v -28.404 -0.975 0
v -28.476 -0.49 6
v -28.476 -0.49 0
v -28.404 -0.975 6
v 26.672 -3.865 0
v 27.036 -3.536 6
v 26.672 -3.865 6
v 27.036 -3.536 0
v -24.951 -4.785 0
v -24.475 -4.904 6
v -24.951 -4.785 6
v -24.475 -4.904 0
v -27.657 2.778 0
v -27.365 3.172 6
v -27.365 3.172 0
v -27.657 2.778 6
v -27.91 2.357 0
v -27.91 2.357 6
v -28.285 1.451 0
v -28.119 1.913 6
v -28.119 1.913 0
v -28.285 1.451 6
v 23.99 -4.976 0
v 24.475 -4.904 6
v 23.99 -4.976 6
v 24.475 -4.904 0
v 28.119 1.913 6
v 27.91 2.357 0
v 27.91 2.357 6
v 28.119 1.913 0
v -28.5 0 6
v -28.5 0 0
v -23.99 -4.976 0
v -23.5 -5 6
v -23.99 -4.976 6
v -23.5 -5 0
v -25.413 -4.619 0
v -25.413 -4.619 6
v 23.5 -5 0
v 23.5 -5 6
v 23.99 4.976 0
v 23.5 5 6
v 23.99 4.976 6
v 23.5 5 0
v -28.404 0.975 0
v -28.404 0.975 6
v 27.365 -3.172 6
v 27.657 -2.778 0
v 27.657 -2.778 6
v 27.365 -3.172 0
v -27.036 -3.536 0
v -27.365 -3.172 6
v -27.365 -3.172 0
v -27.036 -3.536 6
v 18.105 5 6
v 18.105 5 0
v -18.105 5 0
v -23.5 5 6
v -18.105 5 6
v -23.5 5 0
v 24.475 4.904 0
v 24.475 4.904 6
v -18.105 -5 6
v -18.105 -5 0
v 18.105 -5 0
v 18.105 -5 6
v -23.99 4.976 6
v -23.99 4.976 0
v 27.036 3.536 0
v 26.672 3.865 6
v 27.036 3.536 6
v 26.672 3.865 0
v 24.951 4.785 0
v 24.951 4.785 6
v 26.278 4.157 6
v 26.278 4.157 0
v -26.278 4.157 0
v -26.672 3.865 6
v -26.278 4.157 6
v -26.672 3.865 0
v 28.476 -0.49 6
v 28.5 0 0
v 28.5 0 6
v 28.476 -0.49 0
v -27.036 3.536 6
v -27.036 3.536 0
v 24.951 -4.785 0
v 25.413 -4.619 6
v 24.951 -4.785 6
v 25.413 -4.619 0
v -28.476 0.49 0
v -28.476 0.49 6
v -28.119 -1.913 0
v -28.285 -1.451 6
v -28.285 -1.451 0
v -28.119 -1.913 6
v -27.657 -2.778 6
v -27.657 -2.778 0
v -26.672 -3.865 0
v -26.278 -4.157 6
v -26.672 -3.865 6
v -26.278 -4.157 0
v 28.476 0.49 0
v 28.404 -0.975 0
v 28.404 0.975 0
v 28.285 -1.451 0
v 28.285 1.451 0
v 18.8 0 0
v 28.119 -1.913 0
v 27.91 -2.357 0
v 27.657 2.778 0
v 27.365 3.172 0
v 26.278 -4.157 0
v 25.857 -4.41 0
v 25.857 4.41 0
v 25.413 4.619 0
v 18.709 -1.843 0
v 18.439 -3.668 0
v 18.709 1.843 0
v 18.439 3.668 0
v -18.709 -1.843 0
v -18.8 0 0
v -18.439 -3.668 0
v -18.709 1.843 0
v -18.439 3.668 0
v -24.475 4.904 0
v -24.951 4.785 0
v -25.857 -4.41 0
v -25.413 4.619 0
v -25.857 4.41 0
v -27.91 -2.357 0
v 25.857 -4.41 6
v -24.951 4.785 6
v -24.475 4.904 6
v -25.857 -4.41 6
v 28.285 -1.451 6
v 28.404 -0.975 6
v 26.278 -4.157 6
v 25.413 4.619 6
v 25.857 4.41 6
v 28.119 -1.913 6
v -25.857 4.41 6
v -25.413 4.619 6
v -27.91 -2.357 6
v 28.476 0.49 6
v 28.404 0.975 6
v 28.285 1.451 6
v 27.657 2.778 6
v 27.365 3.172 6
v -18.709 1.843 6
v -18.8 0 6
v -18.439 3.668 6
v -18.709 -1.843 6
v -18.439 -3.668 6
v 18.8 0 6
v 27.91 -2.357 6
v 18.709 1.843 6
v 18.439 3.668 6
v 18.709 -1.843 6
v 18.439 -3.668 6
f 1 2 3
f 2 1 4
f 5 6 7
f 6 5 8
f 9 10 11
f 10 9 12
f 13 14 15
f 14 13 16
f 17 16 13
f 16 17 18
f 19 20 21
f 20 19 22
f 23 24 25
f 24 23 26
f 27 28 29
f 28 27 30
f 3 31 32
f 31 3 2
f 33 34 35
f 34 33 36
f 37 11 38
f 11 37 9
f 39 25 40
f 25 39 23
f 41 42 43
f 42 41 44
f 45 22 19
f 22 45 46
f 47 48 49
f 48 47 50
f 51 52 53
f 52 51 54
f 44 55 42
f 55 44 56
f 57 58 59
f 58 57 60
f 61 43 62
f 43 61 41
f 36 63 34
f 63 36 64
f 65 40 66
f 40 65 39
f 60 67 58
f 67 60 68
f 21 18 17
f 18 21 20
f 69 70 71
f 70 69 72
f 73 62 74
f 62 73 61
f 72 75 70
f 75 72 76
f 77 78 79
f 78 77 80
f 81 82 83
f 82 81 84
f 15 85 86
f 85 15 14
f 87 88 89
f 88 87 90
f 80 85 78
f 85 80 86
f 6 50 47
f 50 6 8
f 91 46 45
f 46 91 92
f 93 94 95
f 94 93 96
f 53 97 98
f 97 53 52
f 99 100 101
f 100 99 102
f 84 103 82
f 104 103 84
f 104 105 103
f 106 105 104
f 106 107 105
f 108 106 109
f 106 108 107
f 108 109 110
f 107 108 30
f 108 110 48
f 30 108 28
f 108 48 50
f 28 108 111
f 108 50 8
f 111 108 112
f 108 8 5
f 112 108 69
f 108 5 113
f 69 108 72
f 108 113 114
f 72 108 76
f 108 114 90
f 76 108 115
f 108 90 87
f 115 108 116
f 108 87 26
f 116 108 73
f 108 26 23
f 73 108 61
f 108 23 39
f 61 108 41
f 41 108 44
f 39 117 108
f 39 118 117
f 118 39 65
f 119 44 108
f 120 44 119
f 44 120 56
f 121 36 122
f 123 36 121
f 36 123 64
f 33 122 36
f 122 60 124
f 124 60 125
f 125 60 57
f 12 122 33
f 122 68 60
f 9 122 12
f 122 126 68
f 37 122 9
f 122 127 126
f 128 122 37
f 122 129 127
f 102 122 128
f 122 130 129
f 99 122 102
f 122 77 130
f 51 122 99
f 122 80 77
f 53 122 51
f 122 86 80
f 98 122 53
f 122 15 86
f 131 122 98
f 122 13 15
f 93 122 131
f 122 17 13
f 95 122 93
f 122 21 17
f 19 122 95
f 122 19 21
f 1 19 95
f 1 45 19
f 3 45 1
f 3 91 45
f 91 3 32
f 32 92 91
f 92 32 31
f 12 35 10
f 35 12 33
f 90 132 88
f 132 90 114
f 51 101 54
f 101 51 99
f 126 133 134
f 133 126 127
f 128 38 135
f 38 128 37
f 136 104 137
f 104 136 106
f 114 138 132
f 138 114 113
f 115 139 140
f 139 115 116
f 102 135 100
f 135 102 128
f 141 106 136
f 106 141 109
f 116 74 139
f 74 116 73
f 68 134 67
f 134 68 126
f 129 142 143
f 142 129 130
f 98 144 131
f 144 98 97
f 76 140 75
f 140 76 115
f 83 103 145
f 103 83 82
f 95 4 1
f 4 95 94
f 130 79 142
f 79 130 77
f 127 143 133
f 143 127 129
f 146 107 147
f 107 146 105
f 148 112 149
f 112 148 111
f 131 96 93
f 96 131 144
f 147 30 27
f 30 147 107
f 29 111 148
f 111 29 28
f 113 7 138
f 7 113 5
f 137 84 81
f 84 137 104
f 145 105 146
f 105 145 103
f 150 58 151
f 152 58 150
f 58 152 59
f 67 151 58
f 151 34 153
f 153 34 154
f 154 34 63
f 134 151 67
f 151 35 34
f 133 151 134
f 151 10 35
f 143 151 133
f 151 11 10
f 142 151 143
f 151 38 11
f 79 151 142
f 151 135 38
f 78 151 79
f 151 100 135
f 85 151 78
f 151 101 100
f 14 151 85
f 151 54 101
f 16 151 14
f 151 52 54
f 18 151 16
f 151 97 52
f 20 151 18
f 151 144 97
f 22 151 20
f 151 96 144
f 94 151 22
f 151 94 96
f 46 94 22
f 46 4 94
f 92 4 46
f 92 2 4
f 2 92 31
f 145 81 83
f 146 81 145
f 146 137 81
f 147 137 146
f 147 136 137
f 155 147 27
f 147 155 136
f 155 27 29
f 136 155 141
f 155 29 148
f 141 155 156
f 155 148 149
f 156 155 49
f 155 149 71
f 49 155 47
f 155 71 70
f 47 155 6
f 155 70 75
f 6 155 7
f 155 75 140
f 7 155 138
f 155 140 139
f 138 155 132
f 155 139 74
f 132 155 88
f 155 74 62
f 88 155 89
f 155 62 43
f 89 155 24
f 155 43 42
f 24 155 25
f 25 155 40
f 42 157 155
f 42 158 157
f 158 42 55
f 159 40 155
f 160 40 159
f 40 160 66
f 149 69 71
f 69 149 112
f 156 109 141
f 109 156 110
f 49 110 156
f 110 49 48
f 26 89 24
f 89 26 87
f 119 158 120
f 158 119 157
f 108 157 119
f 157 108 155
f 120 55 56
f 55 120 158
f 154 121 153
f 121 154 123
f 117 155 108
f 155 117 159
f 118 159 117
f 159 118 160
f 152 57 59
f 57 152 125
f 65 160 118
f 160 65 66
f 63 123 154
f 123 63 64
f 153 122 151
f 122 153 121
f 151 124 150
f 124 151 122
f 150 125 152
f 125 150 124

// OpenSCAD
// file: params.scad
// ============================================================================
//  Робосумо 3 кг — спільні параметри
//  Усі розміри в міліметрах. Прав завжди тут, а не в окремих деталях.
//
//  Позначки:
//    ✅  підтверджено з даташита виробника
//    ❓  VERIFY — виміряй свою деталь штангенциркулем і виправ
// ============================================================================

// --- габарит робота ---------------------------------------------------------
CHASSIS_W       = 200;      // ✅ ліміт класу 200 x 200 мм
CHASSIS_L       = 200;
PLATE_T         = 6;        // товщина друкованого прототипу основи
ALLOY_T         = 4;        // товщина алюмінієвої бойової основи

// --- колеса -----------------------------------------------------------------
WHEEL_D         = 50;
WHEEL_W         = 15;
WHEEL_TRACK     = 150;      // між центрами коліс уздовж осі X
WHEELBASE       = 130;      // між центрами коліс уздовж осі Y

// --- мотор Pololu 37D (✅ усі з pololu.com/product/4745) --------------------
MOTOR_BODY_D    = 37;       // ✅ діаметр корпусу редуктора
MOTOR_SHAFT_D   = 6;        // ✅ D-подібний вал
MOTOR_SHAFT_L   = 16;       // ✅ довжина вала
MOTOR_HEX_PITCH = 15.5;     // ✅ суміжні отвори кріплення, правильний шестикутник
MOTOR_HEX_R     = MOTOR_HEX_PITCH / sqrt(3);   // ≈ 8.949 радіус описаного кола
MOTOR_SCREW_MAX = 3;        // ✅ Pololu: НЕ закручувати глибше 3 мм — дістане шестерні
MOTOR_TOTAL_L   = 57;       // ✅ 37Dx57L

// --- кріплення --------------------------------------------------------------
M3_CLEAR        = 3.4;
M3_TAP          = 2.9;
M2_CLEAR        = 2.2;
HEATSET_M3_D    = 4.0;      // отвір під термозакладну гайку M3
HEATSET_M3_H    = 5.7;

// --- плати (❓ виміряй свої) ------------------------------------------------
NANO_W          = 18;       // ✅ стандарт Arduino Nano
NANO_L          = 45;
NANO_HOLE_DX    = 15.24;    // ✅ 0.6 дюйма
NANO_HOLE_DY    = 43.18;    // ✅ 1.7 дюйма

BTS_W           = 25;       // ❓ VERIFY — плата BTS7960 / IBT-2
BTS_L           = 50;       // ❓ VERIFY
BTS_HOLE_DX     = 15;       // ❓ VERIFY
BTS_HOLE_DY     = 44;       // ❓ VERIFY
BTS_QTY         = 4;

QTR_W           = 12;       // ❓ VERIFY — Pololu QTR-8A
QTR_L           = 75;       // ❓ VERIFY
QTR_HOLE_DX     = 10;       // ❓ VERIFY
QTR_HOLE_DY     = 67;       // ❓ VERIFY

// --- акумулятор (❓ виміряй свій) -------------------------------------------
LIP_W           = 34;       // ❓ VERIFY — 6S 2200 мА·год
LIP_L           = 105;      // ❓ VERIFY
LIP_H           = 26;       // ❓ VERIFY

// --- клин -------------------------------------------------------------------
BLADE_W         = 190;
BLADE_T         = 3;
BLADE_ANGLE     = 12;       // ✅ наш вибір: 8–12° за «Blackbook»
BLADE_SCREWS    = 4;

// --- серво ------------------------------------------------------------------
SERVO_W         = 23;       // SG90
SERVO_L         = 32.5;
SERVO_H         = 29;

// --- магніти -----------------------------------------------------------------
MAG_W           = 20;       // 20 x 20 x 5 мм N52
MAG_D           = 5;

// --- якість друку -----------------------------------------------------------
$fn = 64;                   // гладкість круглих отворів
EPS = 0.01;                 // мікро-перекриття для булевих операцій

// ============================================================================
//  Допоміжні модулі
// ============================================================================

// Отвір під гвинт M3 з фаскою, щоб гвинт сідав рівно
module m3_hole(h = 20, head = true) {
    cylinder(d = M3_CLEAR, h = h + 2*EPS, center = true);
    if (head)
        translate([0, 0, h/2])
            cylinder(d1 = M3_CLEAR, d2 = 6.2, h = 1.6);
}

// Отвір під термозакладну гайку M3 (зверху вниз)
module heatset_hole() {
    cylinder(d = HEATSET_M3_D, h = HEATSET_M3_H, center = false);
    translate([0, 0, HEATSET_M3_H])
        cylinder(d = M3_CLEAR, h = 20);
}

// Шість отворів кріплення мотора 37D на правильному шестикутнику.
// Суміжні отвори рознесені рівно на MOTOR_HEX_PITCH.
module motor_mount_holes(depth = 20) {
    for (a = [0 : 60 : 359])
        rotate([0, 0, a])
            translate([MOTOR_HEX_R, 0, 0])
                cylinder(d = M3_CLEAR, h = depth + 2*EPS, center = true);
}

// Шестикутна кишеня під корпус мотора — щоб мотор сів у площину
module motor_body_pocket(depth = 2) {
    translate([0, 0, -depth/2])
        cylinder(d = MOTOR_BODY_D + 0.4, h = depth + EPS, center = true);
}

// Масив отворів по колу — для маточин і фланців
module bolt_circle(dia, n, hole_d = M3_CLEAR, depth = 20) {
    for (i = [0 : n-1])
        rotate([0, 0, i * 360 / n])
            translate([dia/2, 0, 0])
                cylinder(d = hole_d, h = depth + 2*EPS, center = true);
}

// Плита зі скругленими кутами
module rounded_plate(w, h, t, r = 8) {
    linear_extrude(height = t)
        offset(r = r) offset(delta = -r)
            square([w - 2*r, h - 2*r], center = true);
}
// main file
// ============================================================================
//  02 — Хомут мотора 37D
//  Притискає корпус редуктора до основи. Ставиться зверху мотора.
// ============================================================================

include <params.scad>

CLAMP_WALL  = 5;
CLAMP_T     = 6;
CLAMP_LIP   = 3;    // наскільки хомут заходить на корпус

module motor_clamp() {
    difference() {
        // плита з отвором під корпус мотора
        hull() {
            translate([-MOTOR_BODY_D/2 - CLAMP_WALL, 0, 0])
                cylinder(d = CLAMP_WALL*2, h = CLAMP_T);
            translate([ MOTOR_BODY_D/2 + CLAMP_WALL, 0, 0])
                cylinder(d = CLAMP_WALL*2, h = CLAMP_T);
        }

        // посадкове місце корпусу мотора (з зазором 0.3 мм)
        translate([0, 0, -EPS])
            cylinder(d = MOTOR_BODY_D + 0.6, h = CLAMP_T + 2*EPS);

        // два гвинти M3 у площину основи, рознесені як суміжні отвори мотора
        for (sx = [-1, 1])
            translate([sx * MOTOR_HEX_PITCH/2,
                       MOTOR_BODY_D/2 + CLAMP_WALL, -EPS])
                cylinder(d = M3_CLEAR, h = CLAMP_T + 2*EPS);

        // фаски під головки гвинтів
        for (sx = [-1, 1])
            translate([sx * MOTOR_HEX_PITCH/2,
                       MOTOR_BODY_D/2 + CLAMP_WALL, CLAMP_T])
                cylinder(d1 = M3_CLEAR, d2 = 6.4, h = 1.6);
    }

    // два «вуха», що тримають мотор від осьового зсуву
    for (sx = [-1, 1])
        translate([sx * (MOTOR_BODY_D/2 + CLAMP_WALL/2), 0, CLAMP_T - 1])
            difference() {
                cylinder(d = CLAMP_WALL, h = 3);
                translate([0, 0, -EPS])
                    cylinder(d = MOTOR_BODY_D + 0.6, h = 3 + 2*EPS);
            }
}

motor_clamp();
